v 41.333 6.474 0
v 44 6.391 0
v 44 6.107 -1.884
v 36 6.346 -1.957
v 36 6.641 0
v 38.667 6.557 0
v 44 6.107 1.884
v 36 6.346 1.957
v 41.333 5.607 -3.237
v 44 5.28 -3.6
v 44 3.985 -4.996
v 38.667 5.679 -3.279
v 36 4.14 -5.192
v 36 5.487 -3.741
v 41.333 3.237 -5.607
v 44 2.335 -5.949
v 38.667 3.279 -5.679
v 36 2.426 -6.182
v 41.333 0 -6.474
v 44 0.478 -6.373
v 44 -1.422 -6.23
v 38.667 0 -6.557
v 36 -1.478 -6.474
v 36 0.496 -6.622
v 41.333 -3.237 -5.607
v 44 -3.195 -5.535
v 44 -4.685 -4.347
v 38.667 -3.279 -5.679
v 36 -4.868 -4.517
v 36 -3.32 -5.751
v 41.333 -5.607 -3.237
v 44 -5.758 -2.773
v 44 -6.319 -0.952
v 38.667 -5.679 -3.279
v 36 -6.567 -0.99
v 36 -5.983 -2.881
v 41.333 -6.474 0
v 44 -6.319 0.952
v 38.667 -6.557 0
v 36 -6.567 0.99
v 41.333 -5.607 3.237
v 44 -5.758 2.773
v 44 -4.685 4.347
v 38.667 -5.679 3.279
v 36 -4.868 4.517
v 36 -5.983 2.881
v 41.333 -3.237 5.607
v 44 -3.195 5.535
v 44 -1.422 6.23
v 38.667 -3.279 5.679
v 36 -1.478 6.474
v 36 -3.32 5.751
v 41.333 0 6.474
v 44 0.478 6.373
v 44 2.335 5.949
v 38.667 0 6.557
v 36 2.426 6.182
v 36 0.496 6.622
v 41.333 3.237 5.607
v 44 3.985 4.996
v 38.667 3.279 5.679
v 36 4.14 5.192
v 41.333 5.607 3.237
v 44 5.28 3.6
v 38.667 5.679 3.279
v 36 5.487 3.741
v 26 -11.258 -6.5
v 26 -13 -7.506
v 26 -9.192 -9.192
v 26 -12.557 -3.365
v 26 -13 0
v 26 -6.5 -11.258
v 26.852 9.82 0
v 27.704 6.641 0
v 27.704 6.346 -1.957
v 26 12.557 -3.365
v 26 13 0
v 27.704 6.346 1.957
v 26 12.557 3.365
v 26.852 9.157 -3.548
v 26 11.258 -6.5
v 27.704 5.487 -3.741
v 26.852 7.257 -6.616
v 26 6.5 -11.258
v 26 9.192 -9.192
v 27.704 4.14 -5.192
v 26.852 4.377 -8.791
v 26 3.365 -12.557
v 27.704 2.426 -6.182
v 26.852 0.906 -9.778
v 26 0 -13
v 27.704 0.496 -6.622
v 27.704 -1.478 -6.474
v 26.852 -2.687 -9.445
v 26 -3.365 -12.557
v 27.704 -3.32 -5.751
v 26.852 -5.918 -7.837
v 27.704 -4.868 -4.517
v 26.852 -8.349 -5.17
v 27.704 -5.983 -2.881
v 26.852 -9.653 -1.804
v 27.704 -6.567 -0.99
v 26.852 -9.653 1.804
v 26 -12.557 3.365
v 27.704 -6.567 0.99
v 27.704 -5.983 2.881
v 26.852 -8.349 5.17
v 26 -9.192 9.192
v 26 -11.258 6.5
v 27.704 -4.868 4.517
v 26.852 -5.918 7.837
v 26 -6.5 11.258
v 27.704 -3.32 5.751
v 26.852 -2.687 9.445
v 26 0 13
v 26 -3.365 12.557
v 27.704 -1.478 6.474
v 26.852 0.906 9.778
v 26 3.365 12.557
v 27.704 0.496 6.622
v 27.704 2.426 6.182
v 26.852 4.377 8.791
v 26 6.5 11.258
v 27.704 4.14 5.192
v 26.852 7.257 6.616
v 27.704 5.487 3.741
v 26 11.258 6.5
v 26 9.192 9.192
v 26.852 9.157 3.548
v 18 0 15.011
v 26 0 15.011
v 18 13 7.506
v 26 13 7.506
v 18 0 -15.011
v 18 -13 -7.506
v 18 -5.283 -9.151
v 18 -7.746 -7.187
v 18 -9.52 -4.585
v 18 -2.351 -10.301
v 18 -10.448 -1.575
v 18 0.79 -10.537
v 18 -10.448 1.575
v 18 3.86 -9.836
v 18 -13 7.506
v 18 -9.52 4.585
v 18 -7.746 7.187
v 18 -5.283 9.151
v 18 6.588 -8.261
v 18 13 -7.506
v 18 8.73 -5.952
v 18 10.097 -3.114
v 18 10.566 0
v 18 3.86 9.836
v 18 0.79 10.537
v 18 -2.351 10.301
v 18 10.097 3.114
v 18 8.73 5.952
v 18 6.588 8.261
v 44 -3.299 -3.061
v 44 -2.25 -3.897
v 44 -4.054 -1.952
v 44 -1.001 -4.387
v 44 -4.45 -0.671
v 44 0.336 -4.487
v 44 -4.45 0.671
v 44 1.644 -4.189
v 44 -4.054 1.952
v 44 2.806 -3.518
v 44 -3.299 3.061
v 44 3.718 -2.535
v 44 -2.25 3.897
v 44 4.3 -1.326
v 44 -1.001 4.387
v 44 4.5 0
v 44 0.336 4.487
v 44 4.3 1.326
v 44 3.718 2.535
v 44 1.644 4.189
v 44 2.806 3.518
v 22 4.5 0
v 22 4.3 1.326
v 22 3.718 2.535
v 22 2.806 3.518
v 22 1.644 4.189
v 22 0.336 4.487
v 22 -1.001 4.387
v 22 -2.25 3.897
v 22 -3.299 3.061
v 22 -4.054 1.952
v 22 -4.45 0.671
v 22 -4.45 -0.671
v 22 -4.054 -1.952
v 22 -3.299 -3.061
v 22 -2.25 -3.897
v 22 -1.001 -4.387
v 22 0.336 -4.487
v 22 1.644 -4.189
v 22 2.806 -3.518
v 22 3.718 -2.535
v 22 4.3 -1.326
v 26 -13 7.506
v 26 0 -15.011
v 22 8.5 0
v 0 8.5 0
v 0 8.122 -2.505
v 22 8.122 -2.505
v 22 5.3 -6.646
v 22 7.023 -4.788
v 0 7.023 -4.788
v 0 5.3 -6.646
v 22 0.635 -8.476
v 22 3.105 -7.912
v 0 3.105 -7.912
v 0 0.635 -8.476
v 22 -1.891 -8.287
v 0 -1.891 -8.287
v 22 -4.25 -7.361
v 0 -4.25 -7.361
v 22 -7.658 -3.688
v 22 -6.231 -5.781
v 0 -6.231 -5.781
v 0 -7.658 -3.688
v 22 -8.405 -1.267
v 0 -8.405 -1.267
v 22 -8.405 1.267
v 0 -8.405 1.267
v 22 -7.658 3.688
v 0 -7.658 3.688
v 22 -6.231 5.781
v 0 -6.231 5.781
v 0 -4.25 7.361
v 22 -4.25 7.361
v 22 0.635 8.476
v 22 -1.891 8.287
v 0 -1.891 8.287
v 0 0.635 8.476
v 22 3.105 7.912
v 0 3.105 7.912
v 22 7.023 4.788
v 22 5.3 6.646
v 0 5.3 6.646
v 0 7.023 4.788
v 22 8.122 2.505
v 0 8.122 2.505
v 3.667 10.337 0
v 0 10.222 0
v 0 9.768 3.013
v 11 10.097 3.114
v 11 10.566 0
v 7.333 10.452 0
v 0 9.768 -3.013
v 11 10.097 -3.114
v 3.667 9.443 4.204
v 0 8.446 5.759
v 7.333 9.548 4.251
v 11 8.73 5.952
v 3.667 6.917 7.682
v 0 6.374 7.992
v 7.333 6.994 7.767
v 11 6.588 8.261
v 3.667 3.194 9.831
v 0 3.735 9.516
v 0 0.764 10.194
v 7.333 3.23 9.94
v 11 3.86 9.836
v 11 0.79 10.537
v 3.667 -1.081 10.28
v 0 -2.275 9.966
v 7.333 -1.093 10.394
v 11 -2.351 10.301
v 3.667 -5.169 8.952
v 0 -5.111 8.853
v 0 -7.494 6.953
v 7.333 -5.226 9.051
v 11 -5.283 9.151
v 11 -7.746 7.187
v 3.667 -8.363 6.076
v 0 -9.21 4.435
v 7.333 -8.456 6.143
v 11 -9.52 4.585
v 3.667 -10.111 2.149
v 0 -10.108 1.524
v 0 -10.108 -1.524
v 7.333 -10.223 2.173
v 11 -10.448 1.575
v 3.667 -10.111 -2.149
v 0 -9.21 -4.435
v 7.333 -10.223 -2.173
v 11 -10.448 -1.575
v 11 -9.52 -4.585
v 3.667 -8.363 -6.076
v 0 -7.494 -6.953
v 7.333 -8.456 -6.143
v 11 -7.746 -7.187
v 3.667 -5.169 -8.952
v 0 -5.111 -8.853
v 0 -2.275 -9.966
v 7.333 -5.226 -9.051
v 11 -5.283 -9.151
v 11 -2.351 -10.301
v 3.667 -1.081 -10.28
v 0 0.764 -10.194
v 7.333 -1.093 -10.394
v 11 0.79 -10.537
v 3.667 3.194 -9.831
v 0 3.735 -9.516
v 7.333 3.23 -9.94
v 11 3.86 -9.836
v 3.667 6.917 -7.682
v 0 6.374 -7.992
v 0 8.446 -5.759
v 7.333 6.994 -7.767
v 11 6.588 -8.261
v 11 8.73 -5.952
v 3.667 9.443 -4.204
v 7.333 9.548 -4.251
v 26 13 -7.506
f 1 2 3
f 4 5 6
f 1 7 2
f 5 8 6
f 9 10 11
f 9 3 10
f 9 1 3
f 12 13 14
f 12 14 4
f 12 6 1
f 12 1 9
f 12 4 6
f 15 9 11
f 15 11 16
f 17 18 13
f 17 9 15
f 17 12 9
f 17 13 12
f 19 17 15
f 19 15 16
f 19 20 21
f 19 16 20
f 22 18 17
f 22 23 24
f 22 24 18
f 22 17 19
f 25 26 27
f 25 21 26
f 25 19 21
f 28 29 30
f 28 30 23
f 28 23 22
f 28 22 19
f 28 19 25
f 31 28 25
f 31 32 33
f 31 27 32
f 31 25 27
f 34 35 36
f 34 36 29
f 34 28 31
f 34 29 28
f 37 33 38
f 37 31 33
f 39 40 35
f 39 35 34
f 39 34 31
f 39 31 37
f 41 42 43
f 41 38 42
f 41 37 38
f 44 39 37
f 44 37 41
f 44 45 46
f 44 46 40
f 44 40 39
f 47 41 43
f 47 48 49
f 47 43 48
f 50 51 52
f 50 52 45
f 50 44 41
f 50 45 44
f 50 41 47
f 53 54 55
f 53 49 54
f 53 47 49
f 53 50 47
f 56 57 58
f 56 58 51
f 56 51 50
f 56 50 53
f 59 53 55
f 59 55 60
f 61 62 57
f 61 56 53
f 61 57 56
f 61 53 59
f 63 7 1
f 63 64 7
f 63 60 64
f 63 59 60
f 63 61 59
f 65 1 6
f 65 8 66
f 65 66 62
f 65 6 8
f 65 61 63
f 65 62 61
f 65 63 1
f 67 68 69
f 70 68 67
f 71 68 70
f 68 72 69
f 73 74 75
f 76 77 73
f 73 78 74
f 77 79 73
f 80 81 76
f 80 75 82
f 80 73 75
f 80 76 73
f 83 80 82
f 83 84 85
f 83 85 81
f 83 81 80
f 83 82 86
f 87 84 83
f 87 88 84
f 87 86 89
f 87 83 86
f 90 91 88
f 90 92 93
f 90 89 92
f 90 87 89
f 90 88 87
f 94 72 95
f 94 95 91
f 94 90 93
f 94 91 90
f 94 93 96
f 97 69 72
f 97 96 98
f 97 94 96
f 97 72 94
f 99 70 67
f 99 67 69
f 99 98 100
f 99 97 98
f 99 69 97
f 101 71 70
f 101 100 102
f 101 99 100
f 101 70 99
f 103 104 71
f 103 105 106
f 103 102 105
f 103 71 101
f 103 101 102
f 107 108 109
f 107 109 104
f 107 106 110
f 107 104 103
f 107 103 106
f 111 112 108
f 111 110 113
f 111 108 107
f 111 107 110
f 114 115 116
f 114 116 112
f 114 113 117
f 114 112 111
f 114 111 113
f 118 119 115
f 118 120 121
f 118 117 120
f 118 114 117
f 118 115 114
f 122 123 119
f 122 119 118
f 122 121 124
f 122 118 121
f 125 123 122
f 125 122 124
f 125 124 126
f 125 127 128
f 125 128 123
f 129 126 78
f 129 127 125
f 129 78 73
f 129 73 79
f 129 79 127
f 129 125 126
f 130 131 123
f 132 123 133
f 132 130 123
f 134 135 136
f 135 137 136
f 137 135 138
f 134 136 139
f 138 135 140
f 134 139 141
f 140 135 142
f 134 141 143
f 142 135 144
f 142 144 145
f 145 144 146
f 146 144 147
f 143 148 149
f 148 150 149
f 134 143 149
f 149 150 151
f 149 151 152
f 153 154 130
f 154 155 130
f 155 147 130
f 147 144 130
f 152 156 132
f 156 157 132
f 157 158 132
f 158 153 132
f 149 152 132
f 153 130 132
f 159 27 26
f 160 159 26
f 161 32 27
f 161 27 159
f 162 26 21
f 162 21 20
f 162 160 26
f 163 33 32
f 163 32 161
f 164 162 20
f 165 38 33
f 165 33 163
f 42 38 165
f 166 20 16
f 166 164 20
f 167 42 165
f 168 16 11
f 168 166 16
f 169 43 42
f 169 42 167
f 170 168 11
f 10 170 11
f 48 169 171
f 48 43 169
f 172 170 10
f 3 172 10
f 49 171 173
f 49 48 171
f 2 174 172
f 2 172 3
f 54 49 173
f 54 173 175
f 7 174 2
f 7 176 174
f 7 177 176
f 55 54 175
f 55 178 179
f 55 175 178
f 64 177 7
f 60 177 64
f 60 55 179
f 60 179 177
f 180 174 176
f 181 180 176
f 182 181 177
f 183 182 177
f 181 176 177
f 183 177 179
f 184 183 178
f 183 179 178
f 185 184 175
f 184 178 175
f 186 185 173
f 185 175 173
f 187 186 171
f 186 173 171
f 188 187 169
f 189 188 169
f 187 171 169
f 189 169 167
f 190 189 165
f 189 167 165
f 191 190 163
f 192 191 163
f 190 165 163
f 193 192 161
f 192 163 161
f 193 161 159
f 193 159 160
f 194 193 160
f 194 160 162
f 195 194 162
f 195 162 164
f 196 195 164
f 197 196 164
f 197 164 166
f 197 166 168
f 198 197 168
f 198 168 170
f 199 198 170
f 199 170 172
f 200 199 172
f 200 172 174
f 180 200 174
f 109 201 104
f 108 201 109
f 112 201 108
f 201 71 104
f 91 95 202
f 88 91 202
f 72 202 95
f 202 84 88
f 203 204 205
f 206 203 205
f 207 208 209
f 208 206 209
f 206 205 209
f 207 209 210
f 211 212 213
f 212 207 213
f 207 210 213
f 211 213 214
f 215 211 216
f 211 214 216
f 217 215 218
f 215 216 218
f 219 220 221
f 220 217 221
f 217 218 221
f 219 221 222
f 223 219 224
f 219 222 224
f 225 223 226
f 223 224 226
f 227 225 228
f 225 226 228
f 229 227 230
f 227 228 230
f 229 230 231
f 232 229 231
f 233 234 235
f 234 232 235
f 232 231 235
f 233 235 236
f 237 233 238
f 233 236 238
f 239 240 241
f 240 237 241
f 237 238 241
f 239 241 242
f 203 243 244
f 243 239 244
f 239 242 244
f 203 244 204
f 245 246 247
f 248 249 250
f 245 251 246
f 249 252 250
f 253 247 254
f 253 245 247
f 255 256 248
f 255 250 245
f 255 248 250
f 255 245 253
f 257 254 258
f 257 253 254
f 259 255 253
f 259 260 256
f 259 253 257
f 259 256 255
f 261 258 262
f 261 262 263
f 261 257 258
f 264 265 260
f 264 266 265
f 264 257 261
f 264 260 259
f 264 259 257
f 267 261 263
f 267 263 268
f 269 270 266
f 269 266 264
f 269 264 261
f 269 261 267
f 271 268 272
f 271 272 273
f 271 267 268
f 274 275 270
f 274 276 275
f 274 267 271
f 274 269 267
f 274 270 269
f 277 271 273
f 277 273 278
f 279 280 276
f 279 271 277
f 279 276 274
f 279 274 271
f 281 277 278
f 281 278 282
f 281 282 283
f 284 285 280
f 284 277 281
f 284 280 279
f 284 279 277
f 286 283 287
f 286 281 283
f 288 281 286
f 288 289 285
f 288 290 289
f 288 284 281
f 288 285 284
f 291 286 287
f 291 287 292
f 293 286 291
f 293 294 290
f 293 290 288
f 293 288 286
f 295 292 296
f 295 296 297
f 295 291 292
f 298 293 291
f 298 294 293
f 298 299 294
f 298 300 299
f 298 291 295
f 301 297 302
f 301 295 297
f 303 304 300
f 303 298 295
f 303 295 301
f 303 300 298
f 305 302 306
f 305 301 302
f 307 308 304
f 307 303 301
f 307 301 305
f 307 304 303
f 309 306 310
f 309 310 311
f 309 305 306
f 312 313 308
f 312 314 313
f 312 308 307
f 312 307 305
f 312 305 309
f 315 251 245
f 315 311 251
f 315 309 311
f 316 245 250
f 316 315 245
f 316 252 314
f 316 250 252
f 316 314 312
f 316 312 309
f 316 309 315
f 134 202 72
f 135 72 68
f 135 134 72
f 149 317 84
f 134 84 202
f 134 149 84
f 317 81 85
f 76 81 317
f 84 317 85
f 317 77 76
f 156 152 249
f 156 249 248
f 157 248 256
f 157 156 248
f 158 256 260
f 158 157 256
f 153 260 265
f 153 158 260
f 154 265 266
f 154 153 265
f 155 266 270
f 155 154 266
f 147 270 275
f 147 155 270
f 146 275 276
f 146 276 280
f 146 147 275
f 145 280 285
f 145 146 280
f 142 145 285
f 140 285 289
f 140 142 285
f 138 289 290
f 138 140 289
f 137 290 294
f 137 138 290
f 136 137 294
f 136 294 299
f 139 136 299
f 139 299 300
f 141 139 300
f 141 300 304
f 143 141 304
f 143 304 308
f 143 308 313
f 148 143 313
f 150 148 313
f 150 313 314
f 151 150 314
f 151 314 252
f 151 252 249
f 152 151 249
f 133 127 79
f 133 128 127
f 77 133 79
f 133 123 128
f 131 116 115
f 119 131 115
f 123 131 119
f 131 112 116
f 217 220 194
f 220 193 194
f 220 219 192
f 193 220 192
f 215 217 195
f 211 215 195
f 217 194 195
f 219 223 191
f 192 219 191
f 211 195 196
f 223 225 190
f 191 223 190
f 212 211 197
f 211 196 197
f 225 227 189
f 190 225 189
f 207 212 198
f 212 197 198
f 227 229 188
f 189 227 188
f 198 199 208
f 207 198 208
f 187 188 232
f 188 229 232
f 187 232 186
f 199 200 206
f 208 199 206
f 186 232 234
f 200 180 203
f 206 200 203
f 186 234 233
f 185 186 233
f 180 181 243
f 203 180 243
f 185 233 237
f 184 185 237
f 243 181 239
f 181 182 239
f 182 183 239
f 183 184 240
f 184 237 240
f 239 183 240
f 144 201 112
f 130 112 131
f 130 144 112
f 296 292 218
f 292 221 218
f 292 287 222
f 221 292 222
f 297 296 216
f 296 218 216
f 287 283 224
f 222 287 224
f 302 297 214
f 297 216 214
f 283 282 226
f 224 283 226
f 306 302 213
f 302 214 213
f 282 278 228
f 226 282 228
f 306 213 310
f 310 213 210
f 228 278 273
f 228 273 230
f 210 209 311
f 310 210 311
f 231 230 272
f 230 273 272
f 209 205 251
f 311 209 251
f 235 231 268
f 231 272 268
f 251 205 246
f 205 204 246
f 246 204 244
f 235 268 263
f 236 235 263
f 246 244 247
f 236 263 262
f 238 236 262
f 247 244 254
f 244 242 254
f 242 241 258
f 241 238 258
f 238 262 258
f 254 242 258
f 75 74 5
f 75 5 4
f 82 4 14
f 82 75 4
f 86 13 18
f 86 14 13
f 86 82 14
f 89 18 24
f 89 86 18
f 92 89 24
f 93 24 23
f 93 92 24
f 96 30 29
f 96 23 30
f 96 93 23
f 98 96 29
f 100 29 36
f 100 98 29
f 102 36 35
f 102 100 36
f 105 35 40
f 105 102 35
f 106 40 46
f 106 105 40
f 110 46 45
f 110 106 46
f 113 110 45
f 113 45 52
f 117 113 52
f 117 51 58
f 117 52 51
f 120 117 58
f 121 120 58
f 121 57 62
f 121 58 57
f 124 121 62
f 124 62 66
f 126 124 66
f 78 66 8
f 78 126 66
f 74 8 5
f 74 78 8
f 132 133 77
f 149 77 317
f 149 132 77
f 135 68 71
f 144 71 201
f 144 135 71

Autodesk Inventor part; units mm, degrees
ref_plane "YZ Plane" through (0, 0, 0) normal (1, 0, 0) x (0, 1, 0)
ref_plane "XZ Plane" through (0, 0, 0) normal (0, 1, 0) x (-1, 0, 0)
sketch "Sketch1" plane through (0, 0, 0) normal (0, 0, 1) x (1, 0, 0)
  line L0 (0, 0) -> (44, 0)
  line L1 (0, 0) -> (0, 8.5) construction
  line L2 (22, 4.5) -> (22, 8.5)
  line L3 (44, 4.5) -> (44, 0) construction
  line L4 (0, 8.5) -> (0, 10.2225)
  line L5 (44, 4.5) -> (44, 6.3907)
  line L6 (36, 6.6407) -> (36, 4.5) construction
  line L7 (18, 13) -> (26, 13)
  line L8 (22, 8.5) -> (22, 13) construction
  line L9 (22, 8.5) -> (0, 8.5)
  line L10 (22, 4.5) -> (44, 4.5)
  line L11 (0, 10.2225) -> (11, 10.5663)
  line L12 (11, 10.5663) -> (11, 8.5) construction
  line L13 (11, 10.5663) -> (18, 10.5663)
  line L14 (18, 10.5663) -> (18, 13)
  line L15 (44, 6.3907) -> (36, 6.6407)
  line L16 (26, 6.6407) -> (26, 13) construction
  line L17 (22, 4.5) -> (22, 0) construction
  line L18 (26, 13) -> (27.704, 6.6407)
  line L19 (36, 6.6407) -> (27.704, 6.6407)
  line L20 (26, 6.6407) -> (27.704, 6.6407) construction
  line L21 (37.99, 6.5785) -> (37.99, 0) construction
  line L22 (8.16, 10.4775) -> (8.16, 0) construction
  line L23 (11, 8.5) -> (11, 0) construction
  line L24 (36, 4.5) -> (36, 0) construction
  dimension "d0" = 44
  dimension "d3" = 26
  dimension "d4" = 9
  dimension "d5" = 1.79
  dimension "d6" = 17
  dimension "d7" = 1.79
  dimension "d8" = 11
  dimension "d9" = 8
  dimension "d10" = 8
  dimension "d14" = 15
  dimension "d16" = 8.16
  dimension "d17" = 6.01
  dimension "d18" = 13.157
  dimension "d23" = 20.955
revolve "Revolve1" add sketch "Sketch1" angle 360 about axis through (0, 0, 0) along (1, 0, 0)
ref_plane "Work Plane1" through (22, 0, 0) normal (1, 0, 0) x (0, 1, 0)
sketch "Sketch2" plane through (22, 0, 0) normal (1, 0, 0) x (0, 1, 0)
  line L0 (0, -15.0111) -> (-13, -7.5056)
  line L1 (-13, -7.5056) -> (-13, 7.5056)
  line L2 (-13, 7.5056) -> (0, 15.0111)
  line L3 (0, 15.0111) -> (13, 7.5056)
  line L4 (13, 7.5056) -> (13, -7.5056)
  line L5 (13, -7.5056) -> (0, -15.0111)
  circle A0 centre (0, 0) radius 13
  circle A1 centre (0, 0) radius 13 projected
extrude "Extrude1" add sketch "Sketch2" along normal mid plane 8 contours L0 A0 L5 | L0 L1 A0 | A0 L4 L5 | L1 L2 A0 | A0 L3 L4 | L2 L3 A0
thread "Thread1" size "R 1/2" standard "JIS Taper" full length
thread "Thread2" size "R 1/4" standard "JIS Taper" full length
equation "\"d0\" = L"
equation "\"d3\" = S"
equation "\"d4\" = A32 - 2 * t2"
equation "\"d6\" = A31 - 2 * t1"
equation "\"d8\" = L1"
equation "\"d9\" = M"
equation "\"d10\" = L2"
equation "\"d16\" = A1"
equation "\"d17\" = A2"
equation "\"d18\" = OD2"
equation "\"d23\" = OD1"
equation "\"d12\" = M"
equation "\"OD1\" = 20.955"
equation "\"OD2\" = 13.157"
equation "\"L\" = 44"
equation "\"M\" = 8"
equation "\"S\" = 26"
equation "\"L1\" = 11"
equation "\"L2\" = 8"
equation "\"d11\" = 0.5 * L"
equation "\"A1\" = 8.16"
equation "\"A2\" = 6.01"
equation "\"A31\" = 22"
equation "\"A32\" = 14"
equation "\"t1\" = 2.5"
equation "\"t2\" = 2.5"
equation "\"Size_Designation\" = 1.2345"
properties part number "JIS B 2301 Reducing Hexagon Nipple - Class II 1/2 x 1/4" material "Iron, Cast"
